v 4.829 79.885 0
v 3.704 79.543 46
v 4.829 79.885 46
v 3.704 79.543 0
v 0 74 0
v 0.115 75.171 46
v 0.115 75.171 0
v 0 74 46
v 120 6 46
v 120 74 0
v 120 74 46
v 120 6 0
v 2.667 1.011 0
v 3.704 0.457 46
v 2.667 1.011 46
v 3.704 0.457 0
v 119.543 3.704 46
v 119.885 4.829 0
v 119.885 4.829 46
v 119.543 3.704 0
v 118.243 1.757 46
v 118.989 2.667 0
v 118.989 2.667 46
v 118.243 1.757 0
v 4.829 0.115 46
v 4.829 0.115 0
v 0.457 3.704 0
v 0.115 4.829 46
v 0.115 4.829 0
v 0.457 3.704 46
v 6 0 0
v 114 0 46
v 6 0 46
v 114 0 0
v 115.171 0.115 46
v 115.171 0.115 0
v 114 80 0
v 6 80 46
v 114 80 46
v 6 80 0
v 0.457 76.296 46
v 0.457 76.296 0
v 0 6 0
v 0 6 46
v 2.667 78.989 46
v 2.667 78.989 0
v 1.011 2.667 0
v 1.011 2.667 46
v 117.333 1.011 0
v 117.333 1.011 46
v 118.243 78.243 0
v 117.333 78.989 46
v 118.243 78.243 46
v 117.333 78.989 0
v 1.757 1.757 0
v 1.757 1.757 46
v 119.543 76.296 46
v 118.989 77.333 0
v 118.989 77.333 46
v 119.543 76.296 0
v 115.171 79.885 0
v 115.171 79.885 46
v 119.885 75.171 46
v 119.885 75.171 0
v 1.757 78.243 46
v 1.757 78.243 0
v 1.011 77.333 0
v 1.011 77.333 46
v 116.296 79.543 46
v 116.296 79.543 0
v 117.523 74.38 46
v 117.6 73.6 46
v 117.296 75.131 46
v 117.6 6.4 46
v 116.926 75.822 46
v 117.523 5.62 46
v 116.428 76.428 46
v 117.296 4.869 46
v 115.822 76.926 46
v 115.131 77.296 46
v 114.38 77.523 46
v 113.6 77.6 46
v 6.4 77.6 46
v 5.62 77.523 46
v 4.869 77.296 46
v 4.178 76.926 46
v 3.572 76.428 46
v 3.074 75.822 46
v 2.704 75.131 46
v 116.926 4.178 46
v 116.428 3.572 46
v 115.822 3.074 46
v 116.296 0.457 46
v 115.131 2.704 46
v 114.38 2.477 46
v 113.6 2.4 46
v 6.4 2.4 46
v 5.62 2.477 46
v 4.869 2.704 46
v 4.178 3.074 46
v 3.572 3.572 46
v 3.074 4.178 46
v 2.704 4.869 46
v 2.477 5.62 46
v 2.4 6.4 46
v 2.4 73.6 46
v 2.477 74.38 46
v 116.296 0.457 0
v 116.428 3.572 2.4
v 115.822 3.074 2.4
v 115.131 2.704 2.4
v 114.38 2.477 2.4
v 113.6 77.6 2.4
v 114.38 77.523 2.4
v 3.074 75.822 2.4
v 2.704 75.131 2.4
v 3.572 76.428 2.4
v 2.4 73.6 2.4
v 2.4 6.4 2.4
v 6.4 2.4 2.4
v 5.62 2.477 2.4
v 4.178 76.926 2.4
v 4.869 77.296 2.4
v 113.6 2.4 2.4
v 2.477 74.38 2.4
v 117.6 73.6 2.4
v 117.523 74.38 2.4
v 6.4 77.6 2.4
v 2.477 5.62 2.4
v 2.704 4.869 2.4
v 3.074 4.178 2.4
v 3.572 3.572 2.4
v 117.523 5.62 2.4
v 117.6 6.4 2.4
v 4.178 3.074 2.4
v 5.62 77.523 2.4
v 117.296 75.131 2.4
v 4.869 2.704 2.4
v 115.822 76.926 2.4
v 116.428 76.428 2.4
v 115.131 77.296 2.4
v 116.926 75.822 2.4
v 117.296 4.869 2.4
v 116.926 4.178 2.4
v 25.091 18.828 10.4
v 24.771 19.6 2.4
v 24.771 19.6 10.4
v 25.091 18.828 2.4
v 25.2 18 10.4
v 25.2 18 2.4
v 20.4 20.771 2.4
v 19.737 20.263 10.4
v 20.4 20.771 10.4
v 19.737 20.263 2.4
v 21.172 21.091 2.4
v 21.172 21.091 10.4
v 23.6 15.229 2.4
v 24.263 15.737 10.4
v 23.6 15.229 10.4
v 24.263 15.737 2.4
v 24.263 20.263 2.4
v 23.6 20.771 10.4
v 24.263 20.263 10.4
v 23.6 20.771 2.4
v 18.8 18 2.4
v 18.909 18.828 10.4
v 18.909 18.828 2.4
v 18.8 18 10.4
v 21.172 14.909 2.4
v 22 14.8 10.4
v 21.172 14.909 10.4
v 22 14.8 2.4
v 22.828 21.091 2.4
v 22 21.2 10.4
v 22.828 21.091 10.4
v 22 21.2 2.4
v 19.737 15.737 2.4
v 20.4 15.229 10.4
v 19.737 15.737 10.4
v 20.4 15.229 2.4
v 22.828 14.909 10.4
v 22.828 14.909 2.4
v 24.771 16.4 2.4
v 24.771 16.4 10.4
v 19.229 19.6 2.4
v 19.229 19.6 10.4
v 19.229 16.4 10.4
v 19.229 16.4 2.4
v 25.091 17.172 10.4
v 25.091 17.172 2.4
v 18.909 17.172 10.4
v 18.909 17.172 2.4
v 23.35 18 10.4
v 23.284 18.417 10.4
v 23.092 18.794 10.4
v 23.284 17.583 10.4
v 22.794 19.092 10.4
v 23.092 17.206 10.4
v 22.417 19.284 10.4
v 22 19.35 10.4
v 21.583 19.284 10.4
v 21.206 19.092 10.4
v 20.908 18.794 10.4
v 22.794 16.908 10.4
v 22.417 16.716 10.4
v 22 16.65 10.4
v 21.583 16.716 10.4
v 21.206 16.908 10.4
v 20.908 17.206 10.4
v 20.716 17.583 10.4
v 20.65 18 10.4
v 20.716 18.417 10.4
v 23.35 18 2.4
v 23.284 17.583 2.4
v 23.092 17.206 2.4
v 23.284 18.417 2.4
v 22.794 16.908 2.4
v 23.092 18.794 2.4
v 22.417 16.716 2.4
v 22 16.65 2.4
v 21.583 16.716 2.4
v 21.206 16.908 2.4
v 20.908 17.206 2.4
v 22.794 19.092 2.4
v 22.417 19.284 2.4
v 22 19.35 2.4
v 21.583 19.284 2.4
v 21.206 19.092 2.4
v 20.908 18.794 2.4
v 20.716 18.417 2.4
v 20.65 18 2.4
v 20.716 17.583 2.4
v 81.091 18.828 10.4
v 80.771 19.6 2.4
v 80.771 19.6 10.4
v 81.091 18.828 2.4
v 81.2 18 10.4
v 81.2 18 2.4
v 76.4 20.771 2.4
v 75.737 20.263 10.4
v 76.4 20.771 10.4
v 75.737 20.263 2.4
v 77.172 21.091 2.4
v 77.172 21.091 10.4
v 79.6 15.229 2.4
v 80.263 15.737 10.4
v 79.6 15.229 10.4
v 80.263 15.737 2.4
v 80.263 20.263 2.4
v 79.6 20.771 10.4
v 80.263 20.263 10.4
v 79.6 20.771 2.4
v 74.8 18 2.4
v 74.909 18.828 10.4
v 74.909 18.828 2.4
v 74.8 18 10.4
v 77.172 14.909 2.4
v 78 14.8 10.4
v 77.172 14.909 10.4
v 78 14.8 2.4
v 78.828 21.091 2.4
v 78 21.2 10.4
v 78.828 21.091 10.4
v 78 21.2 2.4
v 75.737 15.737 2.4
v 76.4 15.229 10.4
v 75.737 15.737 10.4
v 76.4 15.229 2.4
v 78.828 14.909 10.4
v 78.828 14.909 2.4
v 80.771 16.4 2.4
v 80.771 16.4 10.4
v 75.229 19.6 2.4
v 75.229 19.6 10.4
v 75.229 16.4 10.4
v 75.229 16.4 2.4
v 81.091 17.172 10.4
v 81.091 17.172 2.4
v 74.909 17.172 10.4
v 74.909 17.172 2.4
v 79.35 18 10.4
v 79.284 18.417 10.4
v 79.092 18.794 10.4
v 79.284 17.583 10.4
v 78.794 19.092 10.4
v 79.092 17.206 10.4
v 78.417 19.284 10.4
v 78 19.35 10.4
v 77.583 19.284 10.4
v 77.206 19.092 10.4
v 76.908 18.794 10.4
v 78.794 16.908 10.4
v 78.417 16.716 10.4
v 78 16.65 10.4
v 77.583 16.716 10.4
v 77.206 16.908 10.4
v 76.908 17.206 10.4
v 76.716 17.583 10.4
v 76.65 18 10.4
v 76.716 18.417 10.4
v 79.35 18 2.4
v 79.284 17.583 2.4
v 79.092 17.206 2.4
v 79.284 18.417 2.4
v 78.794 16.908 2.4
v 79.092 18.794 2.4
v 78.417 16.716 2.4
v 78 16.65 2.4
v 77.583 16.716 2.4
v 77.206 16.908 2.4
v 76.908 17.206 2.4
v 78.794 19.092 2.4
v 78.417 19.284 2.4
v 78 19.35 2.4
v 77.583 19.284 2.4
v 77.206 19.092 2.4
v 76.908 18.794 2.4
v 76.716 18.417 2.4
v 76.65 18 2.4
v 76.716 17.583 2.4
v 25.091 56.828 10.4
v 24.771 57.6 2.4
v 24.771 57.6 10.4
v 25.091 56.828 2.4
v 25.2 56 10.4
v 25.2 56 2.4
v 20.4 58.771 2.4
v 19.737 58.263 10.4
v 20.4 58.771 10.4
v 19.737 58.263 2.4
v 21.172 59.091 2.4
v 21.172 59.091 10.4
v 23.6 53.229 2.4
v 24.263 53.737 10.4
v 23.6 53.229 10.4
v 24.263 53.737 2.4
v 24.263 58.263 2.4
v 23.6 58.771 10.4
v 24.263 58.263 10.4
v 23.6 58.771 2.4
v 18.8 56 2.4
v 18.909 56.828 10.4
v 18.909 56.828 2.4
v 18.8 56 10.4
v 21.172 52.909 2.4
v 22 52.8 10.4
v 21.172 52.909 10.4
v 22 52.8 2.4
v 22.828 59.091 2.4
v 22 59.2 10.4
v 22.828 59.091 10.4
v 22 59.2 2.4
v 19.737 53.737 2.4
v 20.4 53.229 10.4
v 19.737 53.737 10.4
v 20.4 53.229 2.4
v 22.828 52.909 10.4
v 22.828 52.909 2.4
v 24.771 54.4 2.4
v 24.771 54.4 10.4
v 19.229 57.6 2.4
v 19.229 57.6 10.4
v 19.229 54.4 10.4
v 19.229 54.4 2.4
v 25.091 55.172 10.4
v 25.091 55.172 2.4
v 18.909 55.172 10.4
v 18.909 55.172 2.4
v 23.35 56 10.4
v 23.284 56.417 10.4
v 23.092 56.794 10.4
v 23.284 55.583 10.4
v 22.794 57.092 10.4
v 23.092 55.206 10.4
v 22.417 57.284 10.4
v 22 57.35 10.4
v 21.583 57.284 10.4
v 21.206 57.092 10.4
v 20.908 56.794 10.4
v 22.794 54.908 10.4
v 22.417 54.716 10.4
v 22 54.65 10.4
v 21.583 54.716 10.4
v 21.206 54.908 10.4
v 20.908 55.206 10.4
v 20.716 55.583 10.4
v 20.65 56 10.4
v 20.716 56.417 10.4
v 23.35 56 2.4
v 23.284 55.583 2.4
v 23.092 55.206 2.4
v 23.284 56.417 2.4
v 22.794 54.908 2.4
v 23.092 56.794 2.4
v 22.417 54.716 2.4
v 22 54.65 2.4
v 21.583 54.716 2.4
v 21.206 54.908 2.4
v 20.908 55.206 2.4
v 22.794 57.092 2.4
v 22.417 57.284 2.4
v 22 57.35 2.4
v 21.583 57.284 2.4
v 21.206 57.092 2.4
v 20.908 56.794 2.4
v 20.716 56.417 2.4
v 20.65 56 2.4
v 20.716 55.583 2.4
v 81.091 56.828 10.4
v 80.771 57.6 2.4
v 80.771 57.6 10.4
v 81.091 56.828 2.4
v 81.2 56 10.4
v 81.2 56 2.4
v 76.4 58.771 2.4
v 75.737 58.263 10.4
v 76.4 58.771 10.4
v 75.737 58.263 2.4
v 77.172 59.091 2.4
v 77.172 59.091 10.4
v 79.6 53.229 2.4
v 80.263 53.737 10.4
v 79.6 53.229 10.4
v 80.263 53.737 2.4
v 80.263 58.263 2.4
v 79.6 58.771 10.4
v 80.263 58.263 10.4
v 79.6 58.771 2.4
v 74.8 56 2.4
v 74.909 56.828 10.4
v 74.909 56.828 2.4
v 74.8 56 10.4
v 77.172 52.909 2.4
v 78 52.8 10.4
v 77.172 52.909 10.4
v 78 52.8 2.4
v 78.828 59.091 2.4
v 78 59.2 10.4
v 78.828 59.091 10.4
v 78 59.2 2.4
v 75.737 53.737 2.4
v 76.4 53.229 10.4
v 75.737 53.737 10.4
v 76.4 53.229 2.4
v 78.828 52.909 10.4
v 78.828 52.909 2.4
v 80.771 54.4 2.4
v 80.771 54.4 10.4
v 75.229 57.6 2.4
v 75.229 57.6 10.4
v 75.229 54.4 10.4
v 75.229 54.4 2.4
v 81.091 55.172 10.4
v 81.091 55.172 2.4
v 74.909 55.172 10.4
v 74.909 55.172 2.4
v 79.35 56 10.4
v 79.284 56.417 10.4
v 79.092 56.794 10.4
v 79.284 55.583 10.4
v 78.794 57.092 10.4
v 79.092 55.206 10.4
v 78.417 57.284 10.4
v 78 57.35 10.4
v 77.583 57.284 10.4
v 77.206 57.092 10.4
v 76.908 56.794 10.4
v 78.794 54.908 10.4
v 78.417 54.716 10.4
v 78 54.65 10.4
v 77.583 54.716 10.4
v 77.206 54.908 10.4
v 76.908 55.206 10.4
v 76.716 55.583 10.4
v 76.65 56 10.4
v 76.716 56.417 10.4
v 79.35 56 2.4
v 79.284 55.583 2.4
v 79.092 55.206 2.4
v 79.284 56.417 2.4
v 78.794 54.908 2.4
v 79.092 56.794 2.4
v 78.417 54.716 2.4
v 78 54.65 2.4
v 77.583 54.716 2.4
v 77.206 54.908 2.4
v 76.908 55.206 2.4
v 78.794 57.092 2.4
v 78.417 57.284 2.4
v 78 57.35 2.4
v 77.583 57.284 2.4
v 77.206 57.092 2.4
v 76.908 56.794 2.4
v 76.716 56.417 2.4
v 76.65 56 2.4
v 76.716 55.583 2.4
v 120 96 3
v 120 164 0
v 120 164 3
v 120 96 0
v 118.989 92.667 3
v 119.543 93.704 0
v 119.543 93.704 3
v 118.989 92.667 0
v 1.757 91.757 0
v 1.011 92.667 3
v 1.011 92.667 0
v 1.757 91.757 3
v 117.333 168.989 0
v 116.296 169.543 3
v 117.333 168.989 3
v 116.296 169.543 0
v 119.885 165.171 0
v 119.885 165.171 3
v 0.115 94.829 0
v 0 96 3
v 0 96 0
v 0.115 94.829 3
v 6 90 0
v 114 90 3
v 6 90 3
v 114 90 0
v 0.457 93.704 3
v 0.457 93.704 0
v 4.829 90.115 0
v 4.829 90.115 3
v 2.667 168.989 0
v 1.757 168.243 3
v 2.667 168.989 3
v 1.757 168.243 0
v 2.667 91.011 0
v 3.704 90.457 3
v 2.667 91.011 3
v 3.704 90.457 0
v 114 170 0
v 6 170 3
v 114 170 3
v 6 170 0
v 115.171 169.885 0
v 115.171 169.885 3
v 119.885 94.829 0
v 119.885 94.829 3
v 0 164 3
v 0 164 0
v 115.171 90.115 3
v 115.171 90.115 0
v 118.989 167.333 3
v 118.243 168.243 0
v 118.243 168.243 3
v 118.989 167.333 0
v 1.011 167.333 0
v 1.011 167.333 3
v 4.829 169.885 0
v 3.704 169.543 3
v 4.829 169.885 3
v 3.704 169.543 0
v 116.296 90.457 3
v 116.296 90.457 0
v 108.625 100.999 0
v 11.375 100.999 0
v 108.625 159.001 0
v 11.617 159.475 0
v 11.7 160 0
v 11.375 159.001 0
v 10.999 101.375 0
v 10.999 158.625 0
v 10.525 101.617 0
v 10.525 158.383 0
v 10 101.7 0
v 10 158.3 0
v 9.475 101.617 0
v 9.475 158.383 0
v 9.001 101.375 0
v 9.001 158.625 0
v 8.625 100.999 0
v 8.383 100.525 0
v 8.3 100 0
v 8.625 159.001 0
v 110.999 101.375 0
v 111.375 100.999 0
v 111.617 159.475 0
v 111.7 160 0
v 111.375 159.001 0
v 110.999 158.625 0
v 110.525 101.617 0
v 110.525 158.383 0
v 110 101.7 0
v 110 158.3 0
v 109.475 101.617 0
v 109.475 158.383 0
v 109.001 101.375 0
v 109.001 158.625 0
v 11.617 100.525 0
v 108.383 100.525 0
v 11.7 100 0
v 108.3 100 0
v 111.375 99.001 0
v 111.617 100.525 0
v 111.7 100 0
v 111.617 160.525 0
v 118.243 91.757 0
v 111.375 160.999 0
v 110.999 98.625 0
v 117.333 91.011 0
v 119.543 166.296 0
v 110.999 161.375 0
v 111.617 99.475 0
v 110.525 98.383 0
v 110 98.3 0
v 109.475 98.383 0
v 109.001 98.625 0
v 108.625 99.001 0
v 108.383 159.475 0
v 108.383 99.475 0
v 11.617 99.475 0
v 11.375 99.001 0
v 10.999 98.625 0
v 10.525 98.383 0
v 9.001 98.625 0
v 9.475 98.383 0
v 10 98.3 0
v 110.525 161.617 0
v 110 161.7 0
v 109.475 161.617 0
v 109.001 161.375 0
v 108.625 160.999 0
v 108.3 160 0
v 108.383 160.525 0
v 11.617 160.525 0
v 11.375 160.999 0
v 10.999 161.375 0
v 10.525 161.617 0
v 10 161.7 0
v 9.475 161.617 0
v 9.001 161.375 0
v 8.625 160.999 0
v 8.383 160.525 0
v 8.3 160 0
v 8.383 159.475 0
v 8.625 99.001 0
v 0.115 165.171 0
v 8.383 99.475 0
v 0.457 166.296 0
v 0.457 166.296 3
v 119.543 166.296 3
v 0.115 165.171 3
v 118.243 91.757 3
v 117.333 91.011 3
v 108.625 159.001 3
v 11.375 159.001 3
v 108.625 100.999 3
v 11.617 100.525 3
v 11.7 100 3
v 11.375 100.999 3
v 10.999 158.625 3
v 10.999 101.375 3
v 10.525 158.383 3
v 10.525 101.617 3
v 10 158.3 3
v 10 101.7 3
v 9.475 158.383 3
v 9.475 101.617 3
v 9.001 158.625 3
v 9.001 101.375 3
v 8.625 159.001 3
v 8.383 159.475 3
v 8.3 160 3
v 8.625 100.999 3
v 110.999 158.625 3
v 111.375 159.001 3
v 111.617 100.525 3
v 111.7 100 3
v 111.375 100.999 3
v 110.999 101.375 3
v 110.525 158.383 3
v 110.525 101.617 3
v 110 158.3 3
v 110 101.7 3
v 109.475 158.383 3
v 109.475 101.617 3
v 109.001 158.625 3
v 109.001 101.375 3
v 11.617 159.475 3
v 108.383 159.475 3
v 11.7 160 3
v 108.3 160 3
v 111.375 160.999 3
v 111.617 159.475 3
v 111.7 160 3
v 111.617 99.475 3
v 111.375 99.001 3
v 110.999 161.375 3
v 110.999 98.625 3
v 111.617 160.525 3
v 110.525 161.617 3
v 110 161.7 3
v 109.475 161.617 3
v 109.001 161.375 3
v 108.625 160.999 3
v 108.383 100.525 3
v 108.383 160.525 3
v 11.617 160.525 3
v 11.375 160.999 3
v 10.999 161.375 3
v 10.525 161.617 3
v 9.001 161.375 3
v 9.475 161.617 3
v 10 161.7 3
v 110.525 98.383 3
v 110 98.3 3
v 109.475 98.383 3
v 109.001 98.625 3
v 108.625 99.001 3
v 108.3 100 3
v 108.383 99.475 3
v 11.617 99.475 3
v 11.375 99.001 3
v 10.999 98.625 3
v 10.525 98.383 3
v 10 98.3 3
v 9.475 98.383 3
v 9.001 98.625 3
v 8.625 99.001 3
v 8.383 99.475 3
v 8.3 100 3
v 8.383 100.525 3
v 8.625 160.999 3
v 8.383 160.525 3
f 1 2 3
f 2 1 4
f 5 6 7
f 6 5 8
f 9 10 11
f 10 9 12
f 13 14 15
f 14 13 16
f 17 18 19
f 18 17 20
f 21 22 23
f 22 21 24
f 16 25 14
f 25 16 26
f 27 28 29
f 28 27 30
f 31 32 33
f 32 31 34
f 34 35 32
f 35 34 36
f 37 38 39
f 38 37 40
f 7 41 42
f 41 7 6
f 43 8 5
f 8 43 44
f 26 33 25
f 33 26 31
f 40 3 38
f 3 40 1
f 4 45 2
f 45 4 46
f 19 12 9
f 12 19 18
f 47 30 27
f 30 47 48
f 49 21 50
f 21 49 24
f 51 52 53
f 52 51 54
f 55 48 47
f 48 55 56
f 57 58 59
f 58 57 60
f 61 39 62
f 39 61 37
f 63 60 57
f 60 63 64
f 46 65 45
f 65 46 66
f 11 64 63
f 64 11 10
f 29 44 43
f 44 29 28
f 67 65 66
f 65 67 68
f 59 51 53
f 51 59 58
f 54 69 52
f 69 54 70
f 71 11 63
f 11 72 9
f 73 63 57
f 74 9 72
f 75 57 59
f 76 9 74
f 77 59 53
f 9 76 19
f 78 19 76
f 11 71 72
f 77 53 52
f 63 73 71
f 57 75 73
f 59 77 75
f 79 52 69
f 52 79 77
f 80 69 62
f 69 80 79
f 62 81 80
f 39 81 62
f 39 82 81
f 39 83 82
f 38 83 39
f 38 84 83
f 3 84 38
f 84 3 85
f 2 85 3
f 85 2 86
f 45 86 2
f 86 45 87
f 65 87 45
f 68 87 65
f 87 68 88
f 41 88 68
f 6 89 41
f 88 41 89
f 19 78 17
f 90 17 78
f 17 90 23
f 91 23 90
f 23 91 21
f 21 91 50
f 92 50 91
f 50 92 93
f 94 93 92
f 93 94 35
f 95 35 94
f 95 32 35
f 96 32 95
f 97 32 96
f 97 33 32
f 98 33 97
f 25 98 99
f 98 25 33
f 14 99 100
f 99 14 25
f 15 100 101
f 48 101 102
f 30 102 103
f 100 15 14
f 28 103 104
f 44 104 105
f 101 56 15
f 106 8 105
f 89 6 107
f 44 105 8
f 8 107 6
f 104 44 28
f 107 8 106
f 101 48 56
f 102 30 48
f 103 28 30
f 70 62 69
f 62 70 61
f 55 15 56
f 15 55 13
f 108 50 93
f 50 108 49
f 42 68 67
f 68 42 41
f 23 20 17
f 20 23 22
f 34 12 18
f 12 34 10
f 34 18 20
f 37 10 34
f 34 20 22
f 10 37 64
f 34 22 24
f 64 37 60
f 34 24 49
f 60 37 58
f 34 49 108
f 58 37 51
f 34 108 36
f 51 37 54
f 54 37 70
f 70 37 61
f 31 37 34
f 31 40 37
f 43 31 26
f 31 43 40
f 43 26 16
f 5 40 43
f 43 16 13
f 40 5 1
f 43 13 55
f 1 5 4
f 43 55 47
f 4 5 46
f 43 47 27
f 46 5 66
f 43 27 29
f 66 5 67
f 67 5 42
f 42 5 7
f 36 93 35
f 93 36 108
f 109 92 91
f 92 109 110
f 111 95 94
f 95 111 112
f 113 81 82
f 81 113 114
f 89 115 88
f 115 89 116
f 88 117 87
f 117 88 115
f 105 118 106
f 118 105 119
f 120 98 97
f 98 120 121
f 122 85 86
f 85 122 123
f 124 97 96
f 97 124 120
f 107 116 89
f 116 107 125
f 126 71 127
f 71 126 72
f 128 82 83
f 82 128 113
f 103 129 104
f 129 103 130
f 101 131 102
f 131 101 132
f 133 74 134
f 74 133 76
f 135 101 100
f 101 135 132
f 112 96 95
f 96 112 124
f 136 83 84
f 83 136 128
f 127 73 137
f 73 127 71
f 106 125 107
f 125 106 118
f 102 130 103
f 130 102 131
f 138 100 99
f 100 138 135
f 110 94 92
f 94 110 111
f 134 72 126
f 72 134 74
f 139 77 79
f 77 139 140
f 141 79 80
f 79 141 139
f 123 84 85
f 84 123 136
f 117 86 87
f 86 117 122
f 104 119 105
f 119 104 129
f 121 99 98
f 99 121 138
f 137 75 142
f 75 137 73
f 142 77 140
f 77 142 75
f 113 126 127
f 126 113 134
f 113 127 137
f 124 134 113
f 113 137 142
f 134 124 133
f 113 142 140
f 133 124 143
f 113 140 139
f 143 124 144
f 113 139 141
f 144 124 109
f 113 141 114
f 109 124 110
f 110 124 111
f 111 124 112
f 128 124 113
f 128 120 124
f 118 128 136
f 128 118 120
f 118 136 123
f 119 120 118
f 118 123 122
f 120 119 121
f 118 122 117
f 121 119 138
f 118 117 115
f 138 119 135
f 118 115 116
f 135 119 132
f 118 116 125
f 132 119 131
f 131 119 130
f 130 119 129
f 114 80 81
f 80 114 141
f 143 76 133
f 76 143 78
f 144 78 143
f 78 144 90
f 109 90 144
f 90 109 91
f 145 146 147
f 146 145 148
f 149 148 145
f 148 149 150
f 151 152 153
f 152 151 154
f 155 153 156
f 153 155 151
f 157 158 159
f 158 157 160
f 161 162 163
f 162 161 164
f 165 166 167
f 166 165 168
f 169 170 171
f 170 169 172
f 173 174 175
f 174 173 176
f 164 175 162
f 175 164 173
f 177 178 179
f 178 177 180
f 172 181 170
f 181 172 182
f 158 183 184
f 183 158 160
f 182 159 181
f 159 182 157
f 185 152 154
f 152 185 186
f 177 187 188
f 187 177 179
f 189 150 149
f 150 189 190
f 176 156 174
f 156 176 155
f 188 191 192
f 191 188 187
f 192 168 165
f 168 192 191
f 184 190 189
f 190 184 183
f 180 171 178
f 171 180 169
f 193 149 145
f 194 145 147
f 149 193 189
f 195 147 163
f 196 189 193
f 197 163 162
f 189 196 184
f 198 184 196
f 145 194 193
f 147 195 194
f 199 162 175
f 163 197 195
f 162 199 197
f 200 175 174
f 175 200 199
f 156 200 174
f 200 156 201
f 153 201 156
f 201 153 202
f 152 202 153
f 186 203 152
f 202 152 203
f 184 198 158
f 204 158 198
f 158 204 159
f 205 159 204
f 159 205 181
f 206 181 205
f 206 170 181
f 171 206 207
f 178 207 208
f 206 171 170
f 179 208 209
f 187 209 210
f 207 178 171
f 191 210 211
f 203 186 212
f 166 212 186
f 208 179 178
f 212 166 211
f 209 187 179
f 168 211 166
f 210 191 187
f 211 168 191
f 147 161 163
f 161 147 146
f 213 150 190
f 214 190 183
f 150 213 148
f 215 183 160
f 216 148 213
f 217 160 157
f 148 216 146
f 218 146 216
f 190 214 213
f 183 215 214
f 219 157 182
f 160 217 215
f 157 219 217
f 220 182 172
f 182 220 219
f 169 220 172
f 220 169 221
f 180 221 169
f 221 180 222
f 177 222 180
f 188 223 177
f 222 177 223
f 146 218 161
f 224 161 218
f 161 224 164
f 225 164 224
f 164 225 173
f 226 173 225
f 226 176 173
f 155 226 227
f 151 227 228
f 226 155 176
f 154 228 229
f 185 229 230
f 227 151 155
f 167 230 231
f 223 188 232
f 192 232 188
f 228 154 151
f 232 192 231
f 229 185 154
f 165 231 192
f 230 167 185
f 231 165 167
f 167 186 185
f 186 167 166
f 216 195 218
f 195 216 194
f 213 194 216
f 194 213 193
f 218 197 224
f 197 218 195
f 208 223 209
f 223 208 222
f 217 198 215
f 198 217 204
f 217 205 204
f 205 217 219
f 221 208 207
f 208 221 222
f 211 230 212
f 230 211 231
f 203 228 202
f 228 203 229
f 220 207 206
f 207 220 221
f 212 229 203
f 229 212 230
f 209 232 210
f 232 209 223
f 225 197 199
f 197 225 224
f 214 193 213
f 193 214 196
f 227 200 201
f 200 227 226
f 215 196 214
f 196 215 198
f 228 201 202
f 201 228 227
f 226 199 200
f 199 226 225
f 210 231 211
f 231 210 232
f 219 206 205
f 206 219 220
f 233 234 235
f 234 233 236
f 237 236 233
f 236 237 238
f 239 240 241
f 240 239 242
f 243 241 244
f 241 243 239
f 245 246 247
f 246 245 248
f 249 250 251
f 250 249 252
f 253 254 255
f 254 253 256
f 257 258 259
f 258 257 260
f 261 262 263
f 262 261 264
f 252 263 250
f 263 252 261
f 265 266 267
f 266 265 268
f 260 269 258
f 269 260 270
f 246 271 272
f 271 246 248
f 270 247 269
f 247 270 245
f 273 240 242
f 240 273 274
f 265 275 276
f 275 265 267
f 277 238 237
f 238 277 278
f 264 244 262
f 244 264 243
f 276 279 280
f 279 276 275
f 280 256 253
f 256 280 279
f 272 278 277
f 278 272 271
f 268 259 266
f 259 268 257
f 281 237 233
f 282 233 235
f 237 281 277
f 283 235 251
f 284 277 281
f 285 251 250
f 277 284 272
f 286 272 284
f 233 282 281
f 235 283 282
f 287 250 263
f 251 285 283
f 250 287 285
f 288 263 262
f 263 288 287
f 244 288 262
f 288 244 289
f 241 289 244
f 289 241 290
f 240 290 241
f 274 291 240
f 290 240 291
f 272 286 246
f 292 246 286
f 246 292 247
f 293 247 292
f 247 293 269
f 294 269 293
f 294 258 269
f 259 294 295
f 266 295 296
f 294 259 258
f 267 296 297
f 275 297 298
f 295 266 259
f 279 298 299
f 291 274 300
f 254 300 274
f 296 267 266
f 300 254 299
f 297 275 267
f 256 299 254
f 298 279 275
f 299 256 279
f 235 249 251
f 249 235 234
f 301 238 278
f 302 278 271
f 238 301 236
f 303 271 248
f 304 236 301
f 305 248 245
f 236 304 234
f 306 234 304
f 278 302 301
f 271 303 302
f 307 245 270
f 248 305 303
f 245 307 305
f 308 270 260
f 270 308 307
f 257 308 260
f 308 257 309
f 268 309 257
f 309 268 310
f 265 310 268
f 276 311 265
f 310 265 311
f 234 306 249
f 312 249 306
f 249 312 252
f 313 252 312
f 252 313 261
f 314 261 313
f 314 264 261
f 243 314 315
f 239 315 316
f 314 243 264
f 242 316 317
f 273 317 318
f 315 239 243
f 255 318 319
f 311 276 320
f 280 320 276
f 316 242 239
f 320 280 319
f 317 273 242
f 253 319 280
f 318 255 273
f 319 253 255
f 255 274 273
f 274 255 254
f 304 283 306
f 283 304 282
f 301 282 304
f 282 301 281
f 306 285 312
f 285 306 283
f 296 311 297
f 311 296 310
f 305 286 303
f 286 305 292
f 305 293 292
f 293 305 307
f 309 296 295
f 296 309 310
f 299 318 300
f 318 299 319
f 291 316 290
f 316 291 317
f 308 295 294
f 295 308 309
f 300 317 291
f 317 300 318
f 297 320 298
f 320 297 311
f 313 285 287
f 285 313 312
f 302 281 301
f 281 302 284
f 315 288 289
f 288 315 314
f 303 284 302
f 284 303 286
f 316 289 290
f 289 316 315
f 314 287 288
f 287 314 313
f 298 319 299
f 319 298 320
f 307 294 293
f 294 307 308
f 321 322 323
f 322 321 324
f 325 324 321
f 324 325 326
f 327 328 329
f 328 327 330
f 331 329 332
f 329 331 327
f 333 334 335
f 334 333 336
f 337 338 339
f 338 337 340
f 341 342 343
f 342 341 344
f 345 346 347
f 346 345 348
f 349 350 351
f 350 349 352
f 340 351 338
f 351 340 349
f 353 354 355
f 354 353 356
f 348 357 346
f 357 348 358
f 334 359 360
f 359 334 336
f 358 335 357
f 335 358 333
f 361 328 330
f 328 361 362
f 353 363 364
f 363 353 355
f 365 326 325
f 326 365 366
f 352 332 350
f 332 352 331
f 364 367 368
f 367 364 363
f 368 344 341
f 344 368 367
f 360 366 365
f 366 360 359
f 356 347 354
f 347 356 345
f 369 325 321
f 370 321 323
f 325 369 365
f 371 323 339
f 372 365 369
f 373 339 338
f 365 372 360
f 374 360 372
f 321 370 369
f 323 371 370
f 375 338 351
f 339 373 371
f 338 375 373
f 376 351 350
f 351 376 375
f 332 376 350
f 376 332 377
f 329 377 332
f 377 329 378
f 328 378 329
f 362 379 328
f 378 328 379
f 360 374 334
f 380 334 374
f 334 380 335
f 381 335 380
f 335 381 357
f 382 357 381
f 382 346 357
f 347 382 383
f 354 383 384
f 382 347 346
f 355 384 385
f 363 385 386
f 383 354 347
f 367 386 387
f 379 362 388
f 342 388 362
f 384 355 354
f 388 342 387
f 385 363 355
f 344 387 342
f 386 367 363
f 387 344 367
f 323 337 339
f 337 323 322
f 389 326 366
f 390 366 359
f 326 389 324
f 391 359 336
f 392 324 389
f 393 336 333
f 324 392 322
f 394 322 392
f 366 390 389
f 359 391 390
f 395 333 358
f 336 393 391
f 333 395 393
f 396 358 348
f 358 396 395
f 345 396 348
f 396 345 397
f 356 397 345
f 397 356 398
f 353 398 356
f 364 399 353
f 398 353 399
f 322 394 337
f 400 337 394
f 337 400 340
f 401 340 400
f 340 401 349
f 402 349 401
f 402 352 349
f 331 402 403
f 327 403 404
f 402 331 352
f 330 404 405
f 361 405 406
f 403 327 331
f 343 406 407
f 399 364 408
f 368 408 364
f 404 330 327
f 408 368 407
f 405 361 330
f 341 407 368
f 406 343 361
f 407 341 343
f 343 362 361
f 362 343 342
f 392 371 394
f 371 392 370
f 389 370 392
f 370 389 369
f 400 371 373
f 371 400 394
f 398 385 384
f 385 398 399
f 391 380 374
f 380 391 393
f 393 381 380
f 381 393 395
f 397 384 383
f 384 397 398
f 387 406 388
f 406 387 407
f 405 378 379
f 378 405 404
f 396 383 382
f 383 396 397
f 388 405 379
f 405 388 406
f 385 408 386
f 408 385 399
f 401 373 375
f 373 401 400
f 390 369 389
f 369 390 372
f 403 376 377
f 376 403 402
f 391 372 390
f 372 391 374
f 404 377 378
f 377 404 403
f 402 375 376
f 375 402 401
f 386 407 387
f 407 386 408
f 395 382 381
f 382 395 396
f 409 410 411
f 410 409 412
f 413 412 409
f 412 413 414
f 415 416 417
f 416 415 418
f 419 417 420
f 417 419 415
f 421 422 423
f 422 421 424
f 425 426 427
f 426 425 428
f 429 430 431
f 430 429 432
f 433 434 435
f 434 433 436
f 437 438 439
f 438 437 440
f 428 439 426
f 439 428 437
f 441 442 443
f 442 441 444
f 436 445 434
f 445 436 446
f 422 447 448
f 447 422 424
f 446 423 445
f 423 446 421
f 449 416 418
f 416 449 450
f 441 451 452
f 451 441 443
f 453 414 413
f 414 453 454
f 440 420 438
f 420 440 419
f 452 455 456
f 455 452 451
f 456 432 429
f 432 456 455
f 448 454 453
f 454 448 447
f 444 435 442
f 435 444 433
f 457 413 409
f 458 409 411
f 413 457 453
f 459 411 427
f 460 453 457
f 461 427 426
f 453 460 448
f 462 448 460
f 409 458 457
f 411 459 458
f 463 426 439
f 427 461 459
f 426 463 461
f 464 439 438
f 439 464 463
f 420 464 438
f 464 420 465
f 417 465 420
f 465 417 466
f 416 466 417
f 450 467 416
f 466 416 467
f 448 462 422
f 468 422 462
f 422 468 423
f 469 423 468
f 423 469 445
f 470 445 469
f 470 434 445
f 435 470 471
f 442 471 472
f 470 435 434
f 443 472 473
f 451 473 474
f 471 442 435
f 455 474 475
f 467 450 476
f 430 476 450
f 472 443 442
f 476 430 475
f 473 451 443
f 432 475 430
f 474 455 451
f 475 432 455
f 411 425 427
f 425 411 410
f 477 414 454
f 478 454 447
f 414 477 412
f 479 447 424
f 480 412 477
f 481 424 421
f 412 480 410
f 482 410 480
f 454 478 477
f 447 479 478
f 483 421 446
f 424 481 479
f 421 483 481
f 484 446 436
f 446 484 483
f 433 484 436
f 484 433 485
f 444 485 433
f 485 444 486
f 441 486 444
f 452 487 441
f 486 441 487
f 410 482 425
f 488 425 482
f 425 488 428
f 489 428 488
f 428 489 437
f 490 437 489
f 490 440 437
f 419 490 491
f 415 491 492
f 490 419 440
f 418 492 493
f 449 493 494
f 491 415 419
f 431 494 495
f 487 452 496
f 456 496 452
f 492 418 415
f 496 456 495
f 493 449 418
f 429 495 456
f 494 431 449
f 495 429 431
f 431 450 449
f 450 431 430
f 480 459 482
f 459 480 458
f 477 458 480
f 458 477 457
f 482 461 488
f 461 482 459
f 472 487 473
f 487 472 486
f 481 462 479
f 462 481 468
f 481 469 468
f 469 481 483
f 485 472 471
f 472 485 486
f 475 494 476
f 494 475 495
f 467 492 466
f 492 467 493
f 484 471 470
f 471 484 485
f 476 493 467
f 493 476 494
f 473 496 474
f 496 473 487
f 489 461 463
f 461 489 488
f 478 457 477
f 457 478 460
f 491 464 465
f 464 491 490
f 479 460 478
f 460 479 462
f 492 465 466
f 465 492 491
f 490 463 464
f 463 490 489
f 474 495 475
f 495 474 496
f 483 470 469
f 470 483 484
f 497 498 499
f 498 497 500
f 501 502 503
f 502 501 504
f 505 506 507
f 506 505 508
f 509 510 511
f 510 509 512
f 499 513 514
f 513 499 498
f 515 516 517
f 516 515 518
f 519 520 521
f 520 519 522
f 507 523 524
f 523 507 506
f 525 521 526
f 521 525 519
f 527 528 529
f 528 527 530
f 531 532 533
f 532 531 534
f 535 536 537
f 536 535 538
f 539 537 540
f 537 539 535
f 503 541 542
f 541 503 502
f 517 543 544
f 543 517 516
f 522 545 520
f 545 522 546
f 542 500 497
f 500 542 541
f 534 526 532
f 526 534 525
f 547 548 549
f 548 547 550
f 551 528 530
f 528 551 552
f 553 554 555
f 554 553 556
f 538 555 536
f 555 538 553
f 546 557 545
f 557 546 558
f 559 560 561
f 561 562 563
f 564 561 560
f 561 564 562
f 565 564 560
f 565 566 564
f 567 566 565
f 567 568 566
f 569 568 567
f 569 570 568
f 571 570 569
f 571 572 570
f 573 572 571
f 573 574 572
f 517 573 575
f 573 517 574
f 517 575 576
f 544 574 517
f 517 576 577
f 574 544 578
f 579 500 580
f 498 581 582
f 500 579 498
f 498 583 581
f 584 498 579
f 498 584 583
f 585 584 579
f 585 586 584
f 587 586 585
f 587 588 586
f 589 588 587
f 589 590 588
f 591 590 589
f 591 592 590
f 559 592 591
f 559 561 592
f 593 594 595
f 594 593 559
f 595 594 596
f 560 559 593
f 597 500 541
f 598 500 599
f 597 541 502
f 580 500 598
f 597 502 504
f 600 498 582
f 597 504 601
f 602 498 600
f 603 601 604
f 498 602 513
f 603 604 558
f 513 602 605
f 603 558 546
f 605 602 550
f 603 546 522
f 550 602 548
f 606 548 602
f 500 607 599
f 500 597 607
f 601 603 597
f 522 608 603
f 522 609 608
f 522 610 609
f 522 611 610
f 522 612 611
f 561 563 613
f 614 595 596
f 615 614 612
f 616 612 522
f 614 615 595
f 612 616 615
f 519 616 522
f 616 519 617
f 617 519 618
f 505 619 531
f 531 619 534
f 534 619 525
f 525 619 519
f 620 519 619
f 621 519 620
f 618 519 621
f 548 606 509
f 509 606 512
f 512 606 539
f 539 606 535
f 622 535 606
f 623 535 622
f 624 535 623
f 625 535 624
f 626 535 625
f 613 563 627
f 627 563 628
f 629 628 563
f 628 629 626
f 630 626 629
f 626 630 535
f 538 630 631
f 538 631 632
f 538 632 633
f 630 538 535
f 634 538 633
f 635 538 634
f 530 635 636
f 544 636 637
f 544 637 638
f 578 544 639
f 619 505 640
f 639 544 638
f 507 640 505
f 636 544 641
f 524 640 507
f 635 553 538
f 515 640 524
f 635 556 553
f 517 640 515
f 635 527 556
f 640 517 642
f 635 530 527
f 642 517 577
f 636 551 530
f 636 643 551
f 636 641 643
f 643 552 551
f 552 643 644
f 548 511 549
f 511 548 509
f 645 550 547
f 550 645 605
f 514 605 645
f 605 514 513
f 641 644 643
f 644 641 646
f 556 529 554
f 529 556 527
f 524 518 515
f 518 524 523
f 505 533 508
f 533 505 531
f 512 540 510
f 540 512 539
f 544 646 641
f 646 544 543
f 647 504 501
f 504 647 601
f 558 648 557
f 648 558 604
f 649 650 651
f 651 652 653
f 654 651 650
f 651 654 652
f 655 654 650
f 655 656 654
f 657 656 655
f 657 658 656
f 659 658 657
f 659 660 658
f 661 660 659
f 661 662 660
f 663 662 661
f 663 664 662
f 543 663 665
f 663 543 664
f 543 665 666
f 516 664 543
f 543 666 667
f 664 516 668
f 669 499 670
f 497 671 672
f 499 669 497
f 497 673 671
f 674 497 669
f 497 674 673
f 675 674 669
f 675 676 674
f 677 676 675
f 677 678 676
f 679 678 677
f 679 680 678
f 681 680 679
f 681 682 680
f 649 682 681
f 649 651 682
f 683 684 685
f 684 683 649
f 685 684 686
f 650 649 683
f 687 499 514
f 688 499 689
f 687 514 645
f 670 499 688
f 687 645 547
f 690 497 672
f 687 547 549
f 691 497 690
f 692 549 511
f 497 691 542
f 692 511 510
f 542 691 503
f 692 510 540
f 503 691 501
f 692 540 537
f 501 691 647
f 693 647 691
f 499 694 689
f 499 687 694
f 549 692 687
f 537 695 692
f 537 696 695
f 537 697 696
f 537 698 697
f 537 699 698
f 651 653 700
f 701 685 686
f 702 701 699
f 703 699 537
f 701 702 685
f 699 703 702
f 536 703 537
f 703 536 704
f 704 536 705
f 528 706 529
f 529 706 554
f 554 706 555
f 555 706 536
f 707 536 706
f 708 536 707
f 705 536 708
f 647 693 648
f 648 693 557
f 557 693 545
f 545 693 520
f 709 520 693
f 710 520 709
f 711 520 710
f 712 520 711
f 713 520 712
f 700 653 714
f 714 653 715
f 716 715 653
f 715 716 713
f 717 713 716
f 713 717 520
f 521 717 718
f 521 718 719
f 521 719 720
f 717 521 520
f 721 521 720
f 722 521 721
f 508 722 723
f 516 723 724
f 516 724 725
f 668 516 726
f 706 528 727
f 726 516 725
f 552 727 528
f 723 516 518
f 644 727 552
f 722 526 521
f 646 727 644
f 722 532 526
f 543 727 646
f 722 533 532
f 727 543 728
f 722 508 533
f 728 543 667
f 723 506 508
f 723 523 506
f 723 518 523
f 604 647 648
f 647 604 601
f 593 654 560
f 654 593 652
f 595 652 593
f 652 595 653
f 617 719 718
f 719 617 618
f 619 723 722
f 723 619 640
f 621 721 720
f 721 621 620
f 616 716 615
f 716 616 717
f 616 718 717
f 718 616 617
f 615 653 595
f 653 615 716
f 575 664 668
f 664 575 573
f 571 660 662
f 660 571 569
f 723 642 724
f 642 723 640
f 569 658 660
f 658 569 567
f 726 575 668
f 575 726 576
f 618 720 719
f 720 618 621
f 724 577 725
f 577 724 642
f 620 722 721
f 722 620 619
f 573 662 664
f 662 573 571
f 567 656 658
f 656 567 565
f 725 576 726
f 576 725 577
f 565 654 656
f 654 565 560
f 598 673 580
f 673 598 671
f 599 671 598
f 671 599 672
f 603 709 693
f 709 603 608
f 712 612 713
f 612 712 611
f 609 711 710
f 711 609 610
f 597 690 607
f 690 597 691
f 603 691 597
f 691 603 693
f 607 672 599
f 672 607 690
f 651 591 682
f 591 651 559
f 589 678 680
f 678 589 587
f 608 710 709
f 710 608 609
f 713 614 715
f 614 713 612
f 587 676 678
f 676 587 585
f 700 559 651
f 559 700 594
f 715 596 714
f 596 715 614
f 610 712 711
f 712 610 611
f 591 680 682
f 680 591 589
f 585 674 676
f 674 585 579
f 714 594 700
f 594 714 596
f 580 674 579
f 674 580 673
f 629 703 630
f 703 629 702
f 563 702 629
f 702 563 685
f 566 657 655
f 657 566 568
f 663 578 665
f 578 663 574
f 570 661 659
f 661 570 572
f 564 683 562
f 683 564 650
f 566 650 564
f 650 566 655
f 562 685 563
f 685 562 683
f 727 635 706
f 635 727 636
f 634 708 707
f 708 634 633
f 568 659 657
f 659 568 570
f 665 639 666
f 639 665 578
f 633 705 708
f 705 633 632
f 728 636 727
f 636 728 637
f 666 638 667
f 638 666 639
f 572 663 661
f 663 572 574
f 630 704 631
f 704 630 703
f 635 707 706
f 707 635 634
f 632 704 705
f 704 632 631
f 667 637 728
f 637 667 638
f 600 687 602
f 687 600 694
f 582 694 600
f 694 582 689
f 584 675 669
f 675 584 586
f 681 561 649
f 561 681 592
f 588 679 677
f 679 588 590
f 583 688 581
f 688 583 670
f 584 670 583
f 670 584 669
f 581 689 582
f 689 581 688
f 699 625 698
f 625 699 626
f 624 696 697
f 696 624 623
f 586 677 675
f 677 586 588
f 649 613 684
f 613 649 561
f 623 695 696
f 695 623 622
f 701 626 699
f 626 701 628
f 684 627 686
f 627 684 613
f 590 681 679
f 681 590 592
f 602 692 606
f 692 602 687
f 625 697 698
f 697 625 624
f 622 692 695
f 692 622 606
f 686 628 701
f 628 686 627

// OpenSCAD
// Greenhouse Pro controller enclosure.
// OpenSCAD source for a simple printable IP65-style project box insert.

wall = 2.4;
box_x = 120;
box_y = 80;
box_z = 46;
lid_z = 3;

module rounded_box(x, y, z, r) {
  hull() {
    translate([r, r, 0]) cylinder(h = z, r = r, $fn = 32);
    translate([x - r, r, 0]) cylinder(h = z, r = r, $fn = 32);
    translate([r, y - r, 0]) cylinder(h = z, r = r, $fn = 32);
    translate([x - r, y - r, 0]) cylinder(h = z, r = r, $fn = 32);
  }
}

module base() {
  difference() {
    rounded_box(box_x, box_y, box_z, 6);
    translate([wall, wall, wall])
      rounded_box(box_x - 2 * wall, box_y - 2 * wall, box_z, 4);
    translate([12, -1, 18]) rotate([90, 0, 0]) cylinder(h = 6, r = 5, $fn = 32);
    translate([34, -1, 18]) rotate([90, 0, 0]) cylinder(h = 6, r = 5, $fn = 32);
    translate([56, -1, 18]) rotate([90, 0, 0]) cylinder(h = 6, r = 5, $fn = 32);
    translate([86, -1, 18]) rotate([90, 0, 0]) cylinder(h = 6, r = 6, $fn = 32);
  }

  // Board standoffs.
  for (p = [[22, 18], [78, 18], [22, 56], [78, 56]]) {
    translate([p[0], p[1], wall])
      difference() {
        cylinder(h = 8, r = 3.2, $fn = 24);
        translate([0, 0, -1]) cylinder(h = 10, r = 1.35, $fn = 20);
      }
  }
}

module lid() {
  translate([0, box_y + 10, 0])
    difference() {
      rounded_box(box_x, box_y, lid_z, 6);
      translate([10, 10, -1]) cylinder(h = 5, r = 1.7, $fn = 20);
      translate([box_x - 10, 10, -1]) cylinder(h = 5, r = 1.7, $fn = 20);
      translate([10, box_y - 10, -1]) cylinder(h = 5, r = 1.7, $fn = 20);
      translate([box_x - 10, box_y - 10, -1]) cylinder(h = 5, r = 1.7, $fn = 20);
    }
}

base();
lid();
